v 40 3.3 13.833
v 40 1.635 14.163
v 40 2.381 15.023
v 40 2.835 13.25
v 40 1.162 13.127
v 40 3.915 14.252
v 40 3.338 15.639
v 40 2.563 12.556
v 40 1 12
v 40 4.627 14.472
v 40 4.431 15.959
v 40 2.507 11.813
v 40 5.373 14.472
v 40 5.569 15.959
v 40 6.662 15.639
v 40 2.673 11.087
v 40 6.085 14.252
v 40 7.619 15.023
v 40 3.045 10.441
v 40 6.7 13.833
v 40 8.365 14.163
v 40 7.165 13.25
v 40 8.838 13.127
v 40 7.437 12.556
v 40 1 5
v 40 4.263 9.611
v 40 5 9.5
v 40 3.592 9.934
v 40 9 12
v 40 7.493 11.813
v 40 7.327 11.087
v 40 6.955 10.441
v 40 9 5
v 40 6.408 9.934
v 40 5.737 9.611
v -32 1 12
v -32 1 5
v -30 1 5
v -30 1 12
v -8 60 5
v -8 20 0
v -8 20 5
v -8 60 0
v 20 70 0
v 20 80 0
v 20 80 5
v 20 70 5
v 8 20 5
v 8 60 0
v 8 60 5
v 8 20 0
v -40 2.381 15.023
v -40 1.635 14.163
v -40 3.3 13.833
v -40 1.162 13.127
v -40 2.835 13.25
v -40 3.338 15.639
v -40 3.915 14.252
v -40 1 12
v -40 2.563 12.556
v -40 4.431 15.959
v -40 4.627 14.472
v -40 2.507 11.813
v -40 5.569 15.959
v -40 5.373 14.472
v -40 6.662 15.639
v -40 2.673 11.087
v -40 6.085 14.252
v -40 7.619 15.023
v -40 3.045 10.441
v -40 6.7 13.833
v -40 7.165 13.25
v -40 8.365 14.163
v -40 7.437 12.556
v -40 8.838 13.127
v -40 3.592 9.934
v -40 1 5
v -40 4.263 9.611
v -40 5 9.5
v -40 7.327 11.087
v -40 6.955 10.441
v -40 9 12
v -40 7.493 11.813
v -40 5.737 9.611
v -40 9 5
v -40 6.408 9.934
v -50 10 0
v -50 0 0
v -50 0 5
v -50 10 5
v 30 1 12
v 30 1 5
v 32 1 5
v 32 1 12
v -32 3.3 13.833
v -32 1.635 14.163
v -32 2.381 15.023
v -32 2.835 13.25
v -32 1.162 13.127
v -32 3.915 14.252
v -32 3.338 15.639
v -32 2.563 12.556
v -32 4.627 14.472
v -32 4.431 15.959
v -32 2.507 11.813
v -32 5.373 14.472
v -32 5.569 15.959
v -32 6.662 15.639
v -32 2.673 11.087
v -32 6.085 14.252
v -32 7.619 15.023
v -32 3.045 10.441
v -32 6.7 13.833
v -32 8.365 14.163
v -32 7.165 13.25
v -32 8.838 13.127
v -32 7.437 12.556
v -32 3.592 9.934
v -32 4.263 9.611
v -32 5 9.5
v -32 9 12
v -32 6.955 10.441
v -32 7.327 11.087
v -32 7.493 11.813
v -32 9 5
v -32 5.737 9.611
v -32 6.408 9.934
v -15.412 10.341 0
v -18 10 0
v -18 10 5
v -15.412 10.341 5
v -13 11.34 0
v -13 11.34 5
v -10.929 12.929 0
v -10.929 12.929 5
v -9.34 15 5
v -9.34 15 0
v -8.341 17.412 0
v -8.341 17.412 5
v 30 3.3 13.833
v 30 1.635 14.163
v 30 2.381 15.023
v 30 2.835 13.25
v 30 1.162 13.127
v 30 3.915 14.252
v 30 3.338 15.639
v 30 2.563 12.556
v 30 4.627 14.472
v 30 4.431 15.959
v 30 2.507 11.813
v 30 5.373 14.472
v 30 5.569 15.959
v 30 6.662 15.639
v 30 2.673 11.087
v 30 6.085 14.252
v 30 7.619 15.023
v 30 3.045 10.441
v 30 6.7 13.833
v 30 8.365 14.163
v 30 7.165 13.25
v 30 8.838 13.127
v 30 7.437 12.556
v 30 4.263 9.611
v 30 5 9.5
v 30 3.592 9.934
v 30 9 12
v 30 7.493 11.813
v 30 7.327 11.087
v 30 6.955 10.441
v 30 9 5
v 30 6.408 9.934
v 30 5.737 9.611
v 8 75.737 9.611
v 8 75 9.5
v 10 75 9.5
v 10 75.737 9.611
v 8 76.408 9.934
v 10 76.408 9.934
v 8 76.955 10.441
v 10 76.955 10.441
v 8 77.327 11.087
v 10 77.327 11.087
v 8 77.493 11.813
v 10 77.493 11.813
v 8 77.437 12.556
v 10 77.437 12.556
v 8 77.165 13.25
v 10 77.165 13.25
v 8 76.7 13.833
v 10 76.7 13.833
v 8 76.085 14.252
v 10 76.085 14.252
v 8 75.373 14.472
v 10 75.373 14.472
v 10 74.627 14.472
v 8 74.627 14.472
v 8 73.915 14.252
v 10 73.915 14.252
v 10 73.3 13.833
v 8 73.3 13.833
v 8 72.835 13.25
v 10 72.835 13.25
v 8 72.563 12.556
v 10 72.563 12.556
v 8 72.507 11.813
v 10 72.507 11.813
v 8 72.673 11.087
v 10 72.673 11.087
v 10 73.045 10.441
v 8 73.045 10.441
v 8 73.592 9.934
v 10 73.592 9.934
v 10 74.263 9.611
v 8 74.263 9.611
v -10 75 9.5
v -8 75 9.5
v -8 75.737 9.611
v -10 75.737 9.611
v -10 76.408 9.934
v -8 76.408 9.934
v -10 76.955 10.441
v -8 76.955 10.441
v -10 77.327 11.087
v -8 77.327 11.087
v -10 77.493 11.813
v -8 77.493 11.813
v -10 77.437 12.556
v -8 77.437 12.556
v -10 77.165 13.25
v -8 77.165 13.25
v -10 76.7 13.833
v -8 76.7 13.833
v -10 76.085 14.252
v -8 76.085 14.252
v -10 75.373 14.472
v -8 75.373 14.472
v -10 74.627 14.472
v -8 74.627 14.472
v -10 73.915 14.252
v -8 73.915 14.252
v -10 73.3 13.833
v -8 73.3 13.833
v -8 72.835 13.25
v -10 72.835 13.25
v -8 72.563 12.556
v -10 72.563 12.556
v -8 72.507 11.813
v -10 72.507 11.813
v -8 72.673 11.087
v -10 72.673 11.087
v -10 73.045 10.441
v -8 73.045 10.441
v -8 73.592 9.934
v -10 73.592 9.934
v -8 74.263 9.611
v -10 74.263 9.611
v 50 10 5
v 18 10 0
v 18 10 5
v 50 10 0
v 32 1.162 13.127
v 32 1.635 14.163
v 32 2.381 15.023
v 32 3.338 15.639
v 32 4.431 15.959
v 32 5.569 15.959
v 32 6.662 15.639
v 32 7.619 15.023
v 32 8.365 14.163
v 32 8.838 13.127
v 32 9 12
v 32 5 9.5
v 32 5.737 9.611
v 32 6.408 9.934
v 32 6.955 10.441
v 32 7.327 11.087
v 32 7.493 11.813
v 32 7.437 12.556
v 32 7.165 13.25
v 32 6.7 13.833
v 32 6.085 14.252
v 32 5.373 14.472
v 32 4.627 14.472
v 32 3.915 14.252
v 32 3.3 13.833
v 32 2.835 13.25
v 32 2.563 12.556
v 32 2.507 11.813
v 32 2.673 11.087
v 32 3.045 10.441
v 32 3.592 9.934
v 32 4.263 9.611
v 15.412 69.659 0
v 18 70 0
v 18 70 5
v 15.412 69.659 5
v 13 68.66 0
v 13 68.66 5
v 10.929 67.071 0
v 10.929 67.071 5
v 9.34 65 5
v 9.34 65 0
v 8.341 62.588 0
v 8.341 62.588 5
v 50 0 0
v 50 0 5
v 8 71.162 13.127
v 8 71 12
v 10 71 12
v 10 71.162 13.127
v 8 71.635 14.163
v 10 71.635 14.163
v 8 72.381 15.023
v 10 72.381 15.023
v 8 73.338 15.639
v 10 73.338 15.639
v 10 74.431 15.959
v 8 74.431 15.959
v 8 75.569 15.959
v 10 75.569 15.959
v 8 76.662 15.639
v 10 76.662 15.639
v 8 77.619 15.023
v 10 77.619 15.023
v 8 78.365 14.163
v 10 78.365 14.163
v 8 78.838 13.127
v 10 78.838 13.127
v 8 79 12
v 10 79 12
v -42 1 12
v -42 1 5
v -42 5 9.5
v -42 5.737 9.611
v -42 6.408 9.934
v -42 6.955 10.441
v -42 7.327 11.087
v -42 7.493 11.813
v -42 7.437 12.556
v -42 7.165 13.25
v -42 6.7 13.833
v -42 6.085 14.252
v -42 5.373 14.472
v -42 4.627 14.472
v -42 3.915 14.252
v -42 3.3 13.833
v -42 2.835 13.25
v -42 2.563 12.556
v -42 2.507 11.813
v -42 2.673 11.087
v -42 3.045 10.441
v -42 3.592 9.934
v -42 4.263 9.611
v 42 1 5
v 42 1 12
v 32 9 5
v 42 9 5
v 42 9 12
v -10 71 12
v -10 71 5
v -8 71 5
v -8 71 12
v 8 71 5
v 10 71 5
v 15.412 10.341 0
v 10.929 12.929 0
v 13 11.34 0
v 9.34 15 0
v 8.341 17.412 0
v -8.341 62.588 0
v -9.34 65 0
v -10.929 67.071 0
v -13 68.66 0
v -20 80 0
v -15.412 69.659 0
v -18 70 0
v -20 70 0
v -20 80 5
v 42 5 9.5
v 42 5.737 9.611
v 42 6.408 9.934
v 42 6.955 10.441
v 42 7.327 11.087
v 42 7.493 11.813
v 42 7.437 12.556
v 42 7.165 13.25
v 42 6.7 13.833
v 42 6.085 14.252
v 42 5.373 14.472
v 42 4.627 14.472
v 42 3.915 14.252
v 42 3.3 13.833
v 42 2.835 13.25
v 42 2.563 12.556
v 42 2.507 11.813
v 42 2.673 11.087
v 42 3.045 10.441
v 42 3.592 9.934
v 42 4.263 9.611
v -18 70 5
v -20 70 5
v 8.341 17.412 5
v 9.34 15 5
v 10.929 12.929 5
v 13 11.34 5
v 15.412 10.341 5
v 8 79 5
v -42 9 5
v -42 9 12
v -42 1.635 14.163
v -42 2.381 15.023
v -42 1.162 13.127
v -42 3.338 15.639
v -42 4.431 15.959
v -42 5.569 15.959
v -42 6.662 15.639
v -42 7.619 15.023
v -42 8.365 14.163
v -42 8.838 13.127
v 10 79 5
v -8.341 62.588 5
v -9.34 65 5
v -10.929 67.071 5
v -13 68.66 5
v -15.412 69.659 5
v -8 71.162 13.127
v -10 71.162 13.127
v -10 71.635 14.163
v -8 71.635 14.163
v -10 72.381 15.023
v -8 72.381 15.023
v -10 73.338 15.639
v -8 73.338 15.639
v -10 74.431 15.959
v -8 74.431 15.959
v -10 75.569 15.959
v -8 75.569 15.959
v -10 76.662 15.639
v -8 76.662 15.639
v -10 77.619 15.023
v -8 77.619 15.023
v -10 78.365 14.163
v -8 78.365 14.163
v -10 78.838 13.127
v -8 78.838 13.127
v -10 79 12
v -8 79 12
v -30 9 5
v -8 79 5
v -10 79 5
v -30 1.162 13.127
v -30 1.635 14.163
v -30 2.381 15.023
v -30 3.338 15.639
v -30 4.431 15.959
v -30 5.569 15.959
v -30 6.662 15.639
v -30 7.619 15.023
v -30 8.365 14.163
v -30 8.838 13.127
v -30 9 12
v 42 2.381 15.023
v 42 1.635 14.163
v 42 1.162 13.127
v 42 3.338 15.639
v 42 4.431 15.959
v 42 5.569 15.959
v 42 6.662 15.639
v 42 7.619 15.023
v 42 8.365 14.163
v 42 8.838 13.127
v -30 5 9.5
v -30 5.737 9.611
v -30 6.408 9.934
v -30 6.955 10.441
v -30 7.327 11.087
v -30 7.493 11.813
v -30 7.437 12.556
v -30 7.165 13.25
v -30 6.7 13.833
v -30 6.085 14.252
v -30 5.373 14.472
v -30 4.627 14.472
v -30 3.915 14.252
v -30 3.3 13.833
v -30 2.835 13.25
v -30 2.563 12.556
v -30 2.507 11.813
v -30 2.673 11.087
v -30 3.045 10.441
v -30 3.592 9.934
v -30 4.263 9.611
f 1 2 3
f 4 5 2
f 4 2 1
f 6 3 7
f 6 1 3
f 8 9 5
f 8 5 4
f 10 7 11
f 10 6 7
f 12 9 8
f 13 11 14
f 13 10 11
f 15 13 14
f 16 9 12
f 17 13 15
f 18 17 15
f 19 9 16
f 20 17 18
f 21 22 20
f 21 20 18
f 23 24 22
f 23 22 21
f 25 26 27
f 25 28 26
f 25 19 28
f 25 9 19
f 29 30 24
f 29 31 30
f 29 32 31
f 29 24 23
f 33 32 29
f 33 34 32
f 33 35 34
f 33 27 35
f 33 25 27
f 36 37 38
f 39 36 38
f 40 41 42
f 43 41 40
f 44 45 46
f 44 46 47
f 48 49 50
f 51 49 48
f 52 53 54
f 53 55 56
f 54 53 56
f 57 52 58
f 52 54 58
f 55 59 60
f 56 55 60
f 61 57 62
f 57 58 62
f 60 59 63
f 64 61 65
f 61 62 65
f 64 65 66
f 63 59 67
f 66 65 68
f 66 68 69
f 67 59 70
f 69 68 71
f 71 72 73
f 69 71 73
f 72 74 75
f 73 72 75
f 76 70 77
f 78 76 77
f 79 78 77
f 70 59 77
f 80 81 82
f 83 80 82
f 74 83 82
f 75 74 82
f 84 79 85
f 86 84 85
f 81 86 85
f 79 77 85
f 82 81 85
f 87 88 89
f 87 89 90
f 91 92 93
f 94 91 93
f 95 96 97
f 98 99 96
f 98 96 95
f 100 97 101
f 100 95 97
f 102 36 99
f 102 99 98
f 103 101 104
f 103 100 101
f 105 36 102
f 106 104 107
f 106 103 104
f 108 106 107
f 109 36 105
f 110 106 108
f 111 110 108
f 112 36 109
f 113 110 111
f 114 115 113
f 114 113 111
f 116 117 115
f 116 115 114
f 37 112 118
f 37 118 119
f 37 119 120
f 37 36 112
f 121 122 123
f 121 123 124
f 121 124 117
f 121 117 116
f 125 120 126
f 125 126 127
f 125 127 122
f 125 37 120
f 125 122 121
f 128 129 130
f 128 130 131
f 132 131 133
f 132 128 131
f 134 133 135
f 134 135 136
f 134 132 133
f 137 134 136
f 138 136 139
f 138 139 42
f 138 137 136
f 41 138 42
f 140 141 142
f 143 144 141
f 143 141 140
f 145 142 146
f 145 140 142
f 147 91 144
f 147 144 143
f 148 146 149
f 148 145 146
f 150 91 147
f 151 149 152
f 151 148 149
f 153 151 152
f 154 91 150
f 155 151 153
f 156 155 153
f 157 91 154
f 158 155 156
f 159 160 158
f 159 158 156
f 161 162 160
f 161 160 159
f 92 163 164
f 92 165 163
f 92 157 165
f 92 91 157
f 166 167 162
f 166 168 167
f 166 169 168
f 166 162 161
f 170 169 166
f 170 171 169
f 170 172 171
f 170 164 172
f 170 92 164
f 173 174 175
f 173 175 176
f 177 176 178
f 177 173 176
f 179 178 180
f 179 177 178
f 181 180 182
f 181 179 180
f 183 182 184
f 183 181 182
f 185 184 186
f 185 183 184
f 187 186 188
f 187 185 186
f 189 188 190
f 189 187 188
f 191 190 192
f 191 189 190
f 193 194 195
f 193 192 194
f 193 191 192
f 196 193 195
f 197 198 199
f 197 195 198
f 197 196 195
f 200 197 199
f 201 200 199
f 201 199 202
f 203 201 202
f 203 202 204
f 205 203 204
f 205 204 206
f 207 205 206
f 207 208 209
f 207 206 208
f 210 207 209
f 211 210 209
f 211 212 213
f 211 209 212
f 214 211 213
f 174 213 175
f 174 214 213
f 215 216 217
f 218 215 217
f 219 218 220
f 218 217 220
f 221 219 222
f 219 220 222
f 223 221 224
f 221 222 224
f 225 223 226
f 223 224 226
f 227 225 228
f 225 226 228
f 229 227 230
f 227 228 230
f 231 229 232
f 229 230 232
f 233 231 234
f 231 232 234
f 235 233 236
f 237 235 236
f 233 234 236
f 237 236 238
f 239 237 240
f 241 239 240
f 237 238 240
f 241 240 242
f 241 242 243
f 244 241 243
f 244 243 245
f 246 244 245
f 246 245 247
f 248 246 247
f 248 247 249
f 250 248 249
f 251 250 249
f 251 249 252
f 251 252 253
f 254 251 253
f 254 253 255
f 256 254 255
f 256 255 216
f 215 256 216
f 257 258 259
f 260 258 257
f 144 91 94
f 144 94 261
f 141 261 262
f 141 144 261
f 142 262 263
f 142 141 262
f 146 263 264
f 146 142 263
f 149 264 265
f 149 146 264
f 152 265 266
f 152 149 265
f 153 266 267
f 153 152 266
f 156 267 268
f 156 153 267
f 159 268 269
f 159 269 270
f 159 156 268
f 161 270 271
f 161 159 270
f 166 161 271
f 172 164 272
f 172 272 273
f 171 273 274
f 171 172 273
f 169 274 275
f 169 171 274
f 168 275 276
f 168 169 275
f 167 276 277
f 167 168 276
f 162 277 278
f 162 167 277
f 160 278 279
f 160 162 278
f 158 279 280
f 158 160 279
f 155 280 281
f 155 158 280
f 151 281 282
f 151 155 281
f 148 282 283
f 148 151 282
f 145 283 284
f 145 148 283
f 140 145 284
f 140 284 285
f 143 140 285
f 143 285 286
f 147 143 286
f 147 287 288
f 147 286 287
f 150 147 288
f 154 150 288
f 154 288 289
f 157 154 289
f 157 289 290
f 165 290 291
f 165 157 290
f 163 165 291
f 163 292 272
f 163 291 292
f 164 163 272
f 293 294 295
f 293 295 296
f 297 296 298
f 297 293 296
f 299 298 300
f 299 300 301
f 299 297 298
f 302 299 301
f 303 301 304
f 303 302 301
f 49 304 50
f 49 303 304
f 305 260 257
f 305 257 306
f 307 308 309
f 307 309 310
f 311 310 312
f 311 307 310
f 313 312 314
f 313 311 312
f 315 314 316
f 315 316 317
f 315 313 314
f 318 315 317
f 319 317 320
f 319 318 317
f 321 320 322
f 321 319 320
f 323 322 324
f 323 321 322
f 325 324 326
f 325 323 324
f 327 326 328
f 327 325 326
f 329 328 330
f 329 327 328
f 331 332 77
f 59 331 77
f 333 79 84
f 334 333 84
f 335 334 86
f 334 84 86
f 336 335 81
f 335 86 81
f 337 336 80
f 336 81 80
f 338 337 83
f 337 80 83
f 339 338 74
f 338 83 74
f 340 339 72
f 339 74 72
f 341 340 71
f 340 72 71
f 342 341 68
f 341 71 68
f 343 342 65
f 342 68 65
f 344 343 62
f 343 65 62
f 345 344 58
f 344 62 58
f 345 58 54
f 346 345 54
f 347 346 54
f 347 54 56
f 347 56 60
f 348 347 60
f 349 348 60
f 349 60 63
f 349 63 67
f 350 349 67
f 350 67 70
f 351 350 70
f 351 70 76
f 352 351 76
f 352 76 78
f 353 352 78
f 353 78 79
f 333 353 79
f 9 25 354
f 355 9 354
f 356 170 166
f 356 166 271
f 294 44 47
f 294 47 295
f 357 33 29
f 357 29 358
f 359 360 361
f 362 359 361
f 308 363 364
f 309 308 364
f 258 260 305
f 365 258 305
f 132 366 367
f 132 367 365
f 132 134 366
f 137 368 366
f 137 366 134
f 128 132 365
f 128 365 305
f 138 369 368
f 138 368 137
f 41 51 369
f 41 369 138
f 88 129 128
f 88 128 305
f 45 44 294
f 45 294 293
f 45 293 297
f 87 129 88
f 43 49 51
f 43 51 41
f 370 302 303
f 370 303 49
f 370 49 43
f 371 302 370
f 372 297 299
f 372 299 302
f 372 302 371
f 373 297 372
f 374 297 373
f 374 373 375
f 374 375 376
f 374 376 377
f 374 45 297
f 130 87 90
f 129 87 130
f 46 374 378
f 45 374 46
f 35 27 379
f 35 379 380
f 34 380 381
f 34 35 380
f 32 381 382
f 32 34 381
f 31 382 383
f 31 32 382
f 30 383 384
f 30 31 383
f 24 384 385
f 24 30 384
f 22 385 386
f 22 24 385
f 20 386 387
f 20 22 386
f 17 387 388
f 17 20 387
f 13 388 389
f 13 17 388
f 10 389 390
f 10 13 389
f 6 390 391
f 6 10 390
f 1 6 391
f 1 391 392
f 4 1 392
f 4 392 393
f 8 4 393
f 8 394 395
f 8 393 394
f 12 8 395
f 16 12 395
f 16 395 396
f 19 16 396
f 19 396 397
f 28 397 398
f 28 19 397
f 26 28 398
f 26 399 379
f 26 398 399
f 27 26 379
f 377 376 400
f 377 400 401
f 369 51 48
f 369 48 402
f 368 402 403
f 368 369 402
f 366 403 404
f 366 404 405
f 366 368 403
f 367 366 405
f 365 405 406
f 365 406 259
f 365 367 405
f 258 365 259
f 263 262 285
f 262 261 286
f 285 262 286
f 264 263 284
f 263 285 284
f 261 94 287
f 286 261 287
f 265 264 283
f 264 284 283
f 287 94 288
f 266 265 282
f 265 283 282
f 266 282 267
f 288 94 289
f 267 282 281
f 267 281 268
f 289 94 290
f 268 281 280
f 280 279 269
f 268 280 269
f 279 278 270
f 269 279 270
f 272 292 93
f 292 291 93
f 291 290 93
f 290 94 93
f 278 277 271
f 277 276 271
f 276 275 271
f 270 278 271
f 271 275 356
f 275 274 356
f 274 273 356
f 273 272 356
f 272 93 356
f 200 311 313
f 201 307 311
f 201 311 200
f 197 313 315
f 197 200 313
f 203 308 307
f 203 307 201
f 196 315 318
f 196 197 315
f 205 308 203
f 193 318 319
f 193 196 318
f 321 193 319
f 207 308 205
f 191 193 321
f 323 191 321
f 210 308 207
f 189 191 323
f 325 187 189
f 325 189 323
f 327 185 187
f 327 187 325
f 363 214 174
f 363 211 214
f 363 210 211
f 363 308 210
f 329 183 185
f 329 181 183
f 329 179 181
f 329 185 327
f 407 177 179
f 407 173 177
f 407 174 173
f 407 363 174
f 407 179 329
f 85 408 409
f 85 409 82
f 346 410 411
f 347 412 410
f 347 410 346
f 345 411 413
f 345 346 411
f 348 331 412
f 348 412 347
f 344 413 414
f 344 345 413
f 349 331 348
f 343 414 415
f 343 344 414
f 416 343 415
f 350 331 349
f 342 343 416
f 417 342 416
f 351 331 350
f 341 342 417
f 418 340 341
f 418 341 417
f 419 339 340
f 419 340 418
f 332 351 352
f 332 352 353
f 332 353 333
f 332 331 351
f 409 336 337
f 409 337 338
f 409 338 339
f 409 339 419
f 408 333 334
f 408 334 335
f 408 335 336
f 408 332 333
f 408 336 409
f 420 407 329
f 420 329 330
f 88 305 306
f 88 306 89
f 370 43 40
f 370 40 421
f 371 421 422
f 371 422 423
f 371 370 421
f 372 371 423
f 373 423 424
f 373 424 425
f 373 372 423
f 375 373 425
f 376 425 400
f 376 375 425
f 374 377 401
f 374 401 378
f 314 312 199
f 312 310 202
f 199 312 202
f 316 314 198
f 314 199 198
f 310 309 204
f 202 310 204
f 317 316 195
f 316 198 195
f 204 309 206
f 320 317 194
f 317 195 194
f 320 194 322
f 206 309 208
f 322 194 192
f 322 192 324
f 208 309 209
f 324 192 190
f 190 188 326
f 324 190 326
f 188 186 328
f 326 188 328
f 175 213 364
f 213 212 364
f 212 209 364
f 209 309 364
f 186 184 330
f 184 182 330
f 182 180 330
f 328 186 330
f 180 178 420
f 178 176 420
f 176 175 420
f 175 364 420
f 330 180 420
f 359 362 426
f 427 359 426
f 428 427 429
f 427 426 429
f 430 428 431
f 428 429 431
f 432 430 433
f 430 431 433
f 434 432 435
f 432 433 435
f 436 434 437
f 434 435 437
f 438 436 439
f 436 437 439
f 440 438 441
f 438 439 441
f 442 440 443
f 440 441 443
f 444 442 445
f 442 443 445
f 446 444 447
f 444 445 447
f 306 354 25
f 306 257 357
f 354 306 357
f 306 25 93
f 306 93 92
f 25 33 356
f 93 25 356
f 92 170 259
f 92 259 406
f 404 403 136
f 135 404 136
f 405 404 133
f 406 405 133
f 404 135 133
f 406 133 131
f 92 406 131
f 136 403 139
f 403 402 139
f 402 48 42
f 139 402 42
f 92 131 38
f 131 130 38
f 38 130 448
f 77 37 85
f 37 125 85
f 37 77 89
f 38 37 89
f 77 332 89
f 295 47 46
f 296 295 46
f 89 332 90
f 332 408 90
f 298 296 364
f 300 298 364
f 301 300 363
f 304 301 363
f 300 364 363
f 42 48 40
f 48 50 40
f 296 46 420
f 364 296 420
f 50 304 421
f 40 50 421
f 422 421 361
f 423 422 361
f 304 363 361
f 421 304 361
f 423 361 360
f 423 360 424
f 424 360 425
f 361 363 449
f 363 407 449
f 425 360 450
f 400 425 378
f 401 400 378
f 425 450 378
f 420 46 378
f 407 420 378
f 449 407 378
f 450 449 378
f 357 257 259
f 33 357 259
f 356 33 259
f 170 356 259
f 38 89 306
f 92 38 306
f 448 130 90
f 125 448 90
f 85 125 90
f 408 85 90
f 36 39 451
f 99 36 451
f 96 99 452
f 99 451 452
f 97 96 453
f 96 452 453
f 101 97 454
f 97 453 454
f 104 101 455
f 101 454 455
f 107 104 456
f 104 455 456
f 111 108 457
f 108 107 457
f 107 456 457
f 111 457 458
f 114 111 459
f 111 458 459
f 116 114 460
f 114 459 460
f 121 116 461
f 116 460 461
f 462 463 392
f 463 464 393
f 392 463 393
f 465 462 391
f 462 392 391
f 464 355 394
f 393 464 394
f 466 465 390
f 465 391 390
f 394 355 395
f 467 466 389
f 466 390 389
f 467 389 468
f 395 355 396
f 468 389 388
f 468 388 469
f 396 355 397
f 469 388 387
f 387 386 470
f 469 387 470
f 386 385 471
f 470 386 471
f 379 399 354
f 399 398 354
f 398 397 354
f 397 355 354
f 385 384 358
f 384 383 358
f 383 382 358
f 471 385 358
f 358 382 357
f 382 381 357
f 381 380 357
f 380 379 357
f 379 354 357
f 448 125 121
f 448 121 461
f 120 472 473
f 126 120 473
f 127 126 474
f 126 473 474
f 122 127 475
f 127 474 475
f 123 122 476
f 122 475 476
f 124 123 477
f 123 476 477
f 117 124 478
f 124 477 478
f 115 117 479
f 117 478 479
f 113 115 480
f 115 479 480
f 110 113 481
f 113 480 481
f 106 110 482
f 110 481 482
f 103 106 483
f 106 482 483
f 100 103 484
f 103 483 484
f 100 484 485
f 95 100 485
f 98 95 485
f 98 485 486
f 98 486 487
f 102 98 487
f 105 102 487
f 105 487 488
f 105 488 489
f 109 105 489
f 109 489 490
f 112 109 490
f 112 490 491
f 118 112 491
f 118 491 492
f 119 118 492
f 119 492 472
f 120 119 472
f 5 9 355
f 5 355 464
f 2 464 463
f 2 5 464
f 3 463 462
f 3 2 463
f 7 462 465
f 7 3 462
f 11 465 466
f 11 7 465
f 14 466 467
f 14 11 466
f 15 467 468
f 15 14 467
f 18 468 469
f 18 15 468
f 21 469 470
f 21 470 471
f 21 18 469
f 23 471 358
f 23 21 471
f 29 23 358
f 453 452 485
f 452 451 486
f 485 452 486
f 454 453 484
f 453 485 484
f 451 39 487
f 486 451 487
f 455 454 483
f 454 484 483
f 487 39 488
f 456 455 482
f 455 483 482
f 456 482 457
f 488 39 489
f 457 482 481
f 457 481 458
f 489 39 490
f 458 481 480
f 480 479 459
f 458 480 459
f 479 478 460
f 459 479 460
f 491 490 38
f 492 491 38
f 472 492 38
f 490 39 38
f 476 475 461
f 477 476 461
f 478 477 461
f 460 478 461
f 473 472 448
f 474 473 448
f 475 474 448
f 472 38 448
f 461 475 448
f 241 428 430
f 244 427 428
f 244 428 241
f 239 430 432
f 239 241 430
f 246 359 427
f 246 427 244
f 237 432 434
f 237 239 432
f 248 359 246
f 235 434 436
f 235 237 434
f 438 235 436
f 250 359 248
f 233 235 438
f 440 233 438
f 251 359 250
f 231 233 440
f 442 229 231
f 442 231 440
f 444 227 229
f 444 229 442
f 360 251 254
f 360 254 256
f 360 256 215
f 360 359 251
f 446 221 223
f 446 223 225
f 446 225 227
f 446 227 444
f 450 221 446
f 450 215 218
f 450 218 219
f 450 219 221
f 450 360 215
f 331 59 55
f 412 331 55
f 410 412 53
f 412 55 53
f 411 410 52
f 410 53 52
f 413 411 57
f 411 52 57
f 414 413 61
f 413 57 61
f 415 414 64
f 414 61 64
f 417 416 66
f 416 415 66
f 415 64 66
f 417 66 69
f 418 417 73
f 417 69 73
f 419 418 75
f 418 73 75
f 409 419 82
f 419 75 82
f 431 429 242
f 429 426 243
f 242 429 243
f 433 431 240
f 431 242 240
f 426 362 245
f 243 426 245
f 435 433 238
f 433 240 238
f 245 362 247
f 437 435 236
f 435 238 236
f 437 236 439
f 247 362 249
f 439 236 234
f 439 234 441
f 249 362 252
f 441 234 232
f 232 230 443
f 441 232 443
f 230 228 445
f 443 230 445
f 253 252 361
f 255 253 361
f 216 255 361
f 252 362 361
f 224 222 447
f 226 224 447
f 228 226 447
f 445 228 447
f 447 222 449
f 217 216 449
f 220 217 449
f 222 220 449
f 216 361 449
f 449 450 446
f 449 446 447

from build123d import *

# Parameters (mm, degrees)
BOSS_EXTRUDE1_DEPTH     = 5
SKETCH4_W               = 2
SKETCH4_H               = 8
BOSS_EXTRUDE2_DEPTH     = 12
SKETCH5_R               = 2.5
CUT_EXTRUDE1_DEPTH      = 51
CUT_EXTRUDE1_DEPTH_BACK = 51


with BuildPart() as part:
    # Sketch2 → Boss-Extrude1 (new body)
    with BuildSketch(Plane.XY):
        with BuildLine():
            Line((-20, 80), (20, 80))
            Line((20, 80), (20, 70))
            Line((20, 70), (18, 70))
            ThreePointArc((18, 70), (10.928932188, 67.071067812), (8, 60))
            Line((8, 60), (8, 20))
            ThreePointArc((8, 20), (10.928932188, 12.928932188), (18, 10))
            Line((18, 10), (50, 10))
            Line((50, 10), (50, 0))
            Line((50, 0), (-50, 0))
            Line((-50, 0), (-50, 10))
            Line((-50, 10), (-18, 10))
            ThreePointArc((-18, 10), (-10.928932188, 12.928932188), (-8, 20))
            Line((-8, 20), (-8, 60))
            ThreePointArc((-8, 60), (-10.928932188, 67.071067812), (-18, 70))
            Line((-18, 70), (-20, 70))
            Line((-20, 70), (-20, 80))
        make_face()
    extrude(amount=BOSS_EXTRUDE1_DEPTH)

    # Sketch4 → Boss-Extrude2 (add)
    with BuildSketch(Plane.XY.offset(5)):
        with Locations((-9, 75)):
            Rectangle(SKETCH4_W, SKETCH4_H)
        with Locations((9, 75)):
            Rectangle(SKETCH4_W, SKETCH4_H)
        with Locations((-41, 5)):
            Rectangle(SKETCH4_W, SKETCH4_H)
        with Locations((-31, 5)):
            Rectangle(SKETCH4_W, SKETCH4_H)
        with Locations((31, 5)):
            Rectangle(SKETCH4_W, SKETCH4_H)
        with Locations((41, 5)):
            Rectangle(SKETCH4_W, SKETCH4_H)
    extrude(amount=BOSS_EXTRUDE2_DEPTH)

    # Sketch5 → Cut-Extrude1 (cut, two sides)
    with BuildSketch(Plane(origin=(0, 0, 0), x_dir=(0, 0, -1), z_dir=(1, 0, 0))) as cut_extrude1_sk:
        with Locations((-12, 75)):
            Circle(SKETCH5_R)
        with Locations((-12, 5)):
            Circle(SKETCH5_R)
        with BuildLine():
            Line((-12, 79), (-17, 79))
            Line((-17, 79), (-17, 71))
            Line((-17, 71), (-12, 71))
            ThreePointArc((-12, 71), (-16, 75), (-12, 79))
        make_face()
        with BuildLine():
            Line((-12, 9), (-17, 9))
            Line((-17, 9), (-17, 1))
            Line((-17, 1), (-12, 1))
            ThreePointArc((-12, 1), (-16, 5), (-12, 9))
        make_face()
    extrude(amount=CUT_EXTRUDE1_DEPTH, mode=Mode.SUBTRACT)
    extrude(cut_extrude1_sk.sketch, amount=-CUT_EXTRUDE1_DEPTH_BACK, mode=Mode.SUBTRACT)


solid = part.part
